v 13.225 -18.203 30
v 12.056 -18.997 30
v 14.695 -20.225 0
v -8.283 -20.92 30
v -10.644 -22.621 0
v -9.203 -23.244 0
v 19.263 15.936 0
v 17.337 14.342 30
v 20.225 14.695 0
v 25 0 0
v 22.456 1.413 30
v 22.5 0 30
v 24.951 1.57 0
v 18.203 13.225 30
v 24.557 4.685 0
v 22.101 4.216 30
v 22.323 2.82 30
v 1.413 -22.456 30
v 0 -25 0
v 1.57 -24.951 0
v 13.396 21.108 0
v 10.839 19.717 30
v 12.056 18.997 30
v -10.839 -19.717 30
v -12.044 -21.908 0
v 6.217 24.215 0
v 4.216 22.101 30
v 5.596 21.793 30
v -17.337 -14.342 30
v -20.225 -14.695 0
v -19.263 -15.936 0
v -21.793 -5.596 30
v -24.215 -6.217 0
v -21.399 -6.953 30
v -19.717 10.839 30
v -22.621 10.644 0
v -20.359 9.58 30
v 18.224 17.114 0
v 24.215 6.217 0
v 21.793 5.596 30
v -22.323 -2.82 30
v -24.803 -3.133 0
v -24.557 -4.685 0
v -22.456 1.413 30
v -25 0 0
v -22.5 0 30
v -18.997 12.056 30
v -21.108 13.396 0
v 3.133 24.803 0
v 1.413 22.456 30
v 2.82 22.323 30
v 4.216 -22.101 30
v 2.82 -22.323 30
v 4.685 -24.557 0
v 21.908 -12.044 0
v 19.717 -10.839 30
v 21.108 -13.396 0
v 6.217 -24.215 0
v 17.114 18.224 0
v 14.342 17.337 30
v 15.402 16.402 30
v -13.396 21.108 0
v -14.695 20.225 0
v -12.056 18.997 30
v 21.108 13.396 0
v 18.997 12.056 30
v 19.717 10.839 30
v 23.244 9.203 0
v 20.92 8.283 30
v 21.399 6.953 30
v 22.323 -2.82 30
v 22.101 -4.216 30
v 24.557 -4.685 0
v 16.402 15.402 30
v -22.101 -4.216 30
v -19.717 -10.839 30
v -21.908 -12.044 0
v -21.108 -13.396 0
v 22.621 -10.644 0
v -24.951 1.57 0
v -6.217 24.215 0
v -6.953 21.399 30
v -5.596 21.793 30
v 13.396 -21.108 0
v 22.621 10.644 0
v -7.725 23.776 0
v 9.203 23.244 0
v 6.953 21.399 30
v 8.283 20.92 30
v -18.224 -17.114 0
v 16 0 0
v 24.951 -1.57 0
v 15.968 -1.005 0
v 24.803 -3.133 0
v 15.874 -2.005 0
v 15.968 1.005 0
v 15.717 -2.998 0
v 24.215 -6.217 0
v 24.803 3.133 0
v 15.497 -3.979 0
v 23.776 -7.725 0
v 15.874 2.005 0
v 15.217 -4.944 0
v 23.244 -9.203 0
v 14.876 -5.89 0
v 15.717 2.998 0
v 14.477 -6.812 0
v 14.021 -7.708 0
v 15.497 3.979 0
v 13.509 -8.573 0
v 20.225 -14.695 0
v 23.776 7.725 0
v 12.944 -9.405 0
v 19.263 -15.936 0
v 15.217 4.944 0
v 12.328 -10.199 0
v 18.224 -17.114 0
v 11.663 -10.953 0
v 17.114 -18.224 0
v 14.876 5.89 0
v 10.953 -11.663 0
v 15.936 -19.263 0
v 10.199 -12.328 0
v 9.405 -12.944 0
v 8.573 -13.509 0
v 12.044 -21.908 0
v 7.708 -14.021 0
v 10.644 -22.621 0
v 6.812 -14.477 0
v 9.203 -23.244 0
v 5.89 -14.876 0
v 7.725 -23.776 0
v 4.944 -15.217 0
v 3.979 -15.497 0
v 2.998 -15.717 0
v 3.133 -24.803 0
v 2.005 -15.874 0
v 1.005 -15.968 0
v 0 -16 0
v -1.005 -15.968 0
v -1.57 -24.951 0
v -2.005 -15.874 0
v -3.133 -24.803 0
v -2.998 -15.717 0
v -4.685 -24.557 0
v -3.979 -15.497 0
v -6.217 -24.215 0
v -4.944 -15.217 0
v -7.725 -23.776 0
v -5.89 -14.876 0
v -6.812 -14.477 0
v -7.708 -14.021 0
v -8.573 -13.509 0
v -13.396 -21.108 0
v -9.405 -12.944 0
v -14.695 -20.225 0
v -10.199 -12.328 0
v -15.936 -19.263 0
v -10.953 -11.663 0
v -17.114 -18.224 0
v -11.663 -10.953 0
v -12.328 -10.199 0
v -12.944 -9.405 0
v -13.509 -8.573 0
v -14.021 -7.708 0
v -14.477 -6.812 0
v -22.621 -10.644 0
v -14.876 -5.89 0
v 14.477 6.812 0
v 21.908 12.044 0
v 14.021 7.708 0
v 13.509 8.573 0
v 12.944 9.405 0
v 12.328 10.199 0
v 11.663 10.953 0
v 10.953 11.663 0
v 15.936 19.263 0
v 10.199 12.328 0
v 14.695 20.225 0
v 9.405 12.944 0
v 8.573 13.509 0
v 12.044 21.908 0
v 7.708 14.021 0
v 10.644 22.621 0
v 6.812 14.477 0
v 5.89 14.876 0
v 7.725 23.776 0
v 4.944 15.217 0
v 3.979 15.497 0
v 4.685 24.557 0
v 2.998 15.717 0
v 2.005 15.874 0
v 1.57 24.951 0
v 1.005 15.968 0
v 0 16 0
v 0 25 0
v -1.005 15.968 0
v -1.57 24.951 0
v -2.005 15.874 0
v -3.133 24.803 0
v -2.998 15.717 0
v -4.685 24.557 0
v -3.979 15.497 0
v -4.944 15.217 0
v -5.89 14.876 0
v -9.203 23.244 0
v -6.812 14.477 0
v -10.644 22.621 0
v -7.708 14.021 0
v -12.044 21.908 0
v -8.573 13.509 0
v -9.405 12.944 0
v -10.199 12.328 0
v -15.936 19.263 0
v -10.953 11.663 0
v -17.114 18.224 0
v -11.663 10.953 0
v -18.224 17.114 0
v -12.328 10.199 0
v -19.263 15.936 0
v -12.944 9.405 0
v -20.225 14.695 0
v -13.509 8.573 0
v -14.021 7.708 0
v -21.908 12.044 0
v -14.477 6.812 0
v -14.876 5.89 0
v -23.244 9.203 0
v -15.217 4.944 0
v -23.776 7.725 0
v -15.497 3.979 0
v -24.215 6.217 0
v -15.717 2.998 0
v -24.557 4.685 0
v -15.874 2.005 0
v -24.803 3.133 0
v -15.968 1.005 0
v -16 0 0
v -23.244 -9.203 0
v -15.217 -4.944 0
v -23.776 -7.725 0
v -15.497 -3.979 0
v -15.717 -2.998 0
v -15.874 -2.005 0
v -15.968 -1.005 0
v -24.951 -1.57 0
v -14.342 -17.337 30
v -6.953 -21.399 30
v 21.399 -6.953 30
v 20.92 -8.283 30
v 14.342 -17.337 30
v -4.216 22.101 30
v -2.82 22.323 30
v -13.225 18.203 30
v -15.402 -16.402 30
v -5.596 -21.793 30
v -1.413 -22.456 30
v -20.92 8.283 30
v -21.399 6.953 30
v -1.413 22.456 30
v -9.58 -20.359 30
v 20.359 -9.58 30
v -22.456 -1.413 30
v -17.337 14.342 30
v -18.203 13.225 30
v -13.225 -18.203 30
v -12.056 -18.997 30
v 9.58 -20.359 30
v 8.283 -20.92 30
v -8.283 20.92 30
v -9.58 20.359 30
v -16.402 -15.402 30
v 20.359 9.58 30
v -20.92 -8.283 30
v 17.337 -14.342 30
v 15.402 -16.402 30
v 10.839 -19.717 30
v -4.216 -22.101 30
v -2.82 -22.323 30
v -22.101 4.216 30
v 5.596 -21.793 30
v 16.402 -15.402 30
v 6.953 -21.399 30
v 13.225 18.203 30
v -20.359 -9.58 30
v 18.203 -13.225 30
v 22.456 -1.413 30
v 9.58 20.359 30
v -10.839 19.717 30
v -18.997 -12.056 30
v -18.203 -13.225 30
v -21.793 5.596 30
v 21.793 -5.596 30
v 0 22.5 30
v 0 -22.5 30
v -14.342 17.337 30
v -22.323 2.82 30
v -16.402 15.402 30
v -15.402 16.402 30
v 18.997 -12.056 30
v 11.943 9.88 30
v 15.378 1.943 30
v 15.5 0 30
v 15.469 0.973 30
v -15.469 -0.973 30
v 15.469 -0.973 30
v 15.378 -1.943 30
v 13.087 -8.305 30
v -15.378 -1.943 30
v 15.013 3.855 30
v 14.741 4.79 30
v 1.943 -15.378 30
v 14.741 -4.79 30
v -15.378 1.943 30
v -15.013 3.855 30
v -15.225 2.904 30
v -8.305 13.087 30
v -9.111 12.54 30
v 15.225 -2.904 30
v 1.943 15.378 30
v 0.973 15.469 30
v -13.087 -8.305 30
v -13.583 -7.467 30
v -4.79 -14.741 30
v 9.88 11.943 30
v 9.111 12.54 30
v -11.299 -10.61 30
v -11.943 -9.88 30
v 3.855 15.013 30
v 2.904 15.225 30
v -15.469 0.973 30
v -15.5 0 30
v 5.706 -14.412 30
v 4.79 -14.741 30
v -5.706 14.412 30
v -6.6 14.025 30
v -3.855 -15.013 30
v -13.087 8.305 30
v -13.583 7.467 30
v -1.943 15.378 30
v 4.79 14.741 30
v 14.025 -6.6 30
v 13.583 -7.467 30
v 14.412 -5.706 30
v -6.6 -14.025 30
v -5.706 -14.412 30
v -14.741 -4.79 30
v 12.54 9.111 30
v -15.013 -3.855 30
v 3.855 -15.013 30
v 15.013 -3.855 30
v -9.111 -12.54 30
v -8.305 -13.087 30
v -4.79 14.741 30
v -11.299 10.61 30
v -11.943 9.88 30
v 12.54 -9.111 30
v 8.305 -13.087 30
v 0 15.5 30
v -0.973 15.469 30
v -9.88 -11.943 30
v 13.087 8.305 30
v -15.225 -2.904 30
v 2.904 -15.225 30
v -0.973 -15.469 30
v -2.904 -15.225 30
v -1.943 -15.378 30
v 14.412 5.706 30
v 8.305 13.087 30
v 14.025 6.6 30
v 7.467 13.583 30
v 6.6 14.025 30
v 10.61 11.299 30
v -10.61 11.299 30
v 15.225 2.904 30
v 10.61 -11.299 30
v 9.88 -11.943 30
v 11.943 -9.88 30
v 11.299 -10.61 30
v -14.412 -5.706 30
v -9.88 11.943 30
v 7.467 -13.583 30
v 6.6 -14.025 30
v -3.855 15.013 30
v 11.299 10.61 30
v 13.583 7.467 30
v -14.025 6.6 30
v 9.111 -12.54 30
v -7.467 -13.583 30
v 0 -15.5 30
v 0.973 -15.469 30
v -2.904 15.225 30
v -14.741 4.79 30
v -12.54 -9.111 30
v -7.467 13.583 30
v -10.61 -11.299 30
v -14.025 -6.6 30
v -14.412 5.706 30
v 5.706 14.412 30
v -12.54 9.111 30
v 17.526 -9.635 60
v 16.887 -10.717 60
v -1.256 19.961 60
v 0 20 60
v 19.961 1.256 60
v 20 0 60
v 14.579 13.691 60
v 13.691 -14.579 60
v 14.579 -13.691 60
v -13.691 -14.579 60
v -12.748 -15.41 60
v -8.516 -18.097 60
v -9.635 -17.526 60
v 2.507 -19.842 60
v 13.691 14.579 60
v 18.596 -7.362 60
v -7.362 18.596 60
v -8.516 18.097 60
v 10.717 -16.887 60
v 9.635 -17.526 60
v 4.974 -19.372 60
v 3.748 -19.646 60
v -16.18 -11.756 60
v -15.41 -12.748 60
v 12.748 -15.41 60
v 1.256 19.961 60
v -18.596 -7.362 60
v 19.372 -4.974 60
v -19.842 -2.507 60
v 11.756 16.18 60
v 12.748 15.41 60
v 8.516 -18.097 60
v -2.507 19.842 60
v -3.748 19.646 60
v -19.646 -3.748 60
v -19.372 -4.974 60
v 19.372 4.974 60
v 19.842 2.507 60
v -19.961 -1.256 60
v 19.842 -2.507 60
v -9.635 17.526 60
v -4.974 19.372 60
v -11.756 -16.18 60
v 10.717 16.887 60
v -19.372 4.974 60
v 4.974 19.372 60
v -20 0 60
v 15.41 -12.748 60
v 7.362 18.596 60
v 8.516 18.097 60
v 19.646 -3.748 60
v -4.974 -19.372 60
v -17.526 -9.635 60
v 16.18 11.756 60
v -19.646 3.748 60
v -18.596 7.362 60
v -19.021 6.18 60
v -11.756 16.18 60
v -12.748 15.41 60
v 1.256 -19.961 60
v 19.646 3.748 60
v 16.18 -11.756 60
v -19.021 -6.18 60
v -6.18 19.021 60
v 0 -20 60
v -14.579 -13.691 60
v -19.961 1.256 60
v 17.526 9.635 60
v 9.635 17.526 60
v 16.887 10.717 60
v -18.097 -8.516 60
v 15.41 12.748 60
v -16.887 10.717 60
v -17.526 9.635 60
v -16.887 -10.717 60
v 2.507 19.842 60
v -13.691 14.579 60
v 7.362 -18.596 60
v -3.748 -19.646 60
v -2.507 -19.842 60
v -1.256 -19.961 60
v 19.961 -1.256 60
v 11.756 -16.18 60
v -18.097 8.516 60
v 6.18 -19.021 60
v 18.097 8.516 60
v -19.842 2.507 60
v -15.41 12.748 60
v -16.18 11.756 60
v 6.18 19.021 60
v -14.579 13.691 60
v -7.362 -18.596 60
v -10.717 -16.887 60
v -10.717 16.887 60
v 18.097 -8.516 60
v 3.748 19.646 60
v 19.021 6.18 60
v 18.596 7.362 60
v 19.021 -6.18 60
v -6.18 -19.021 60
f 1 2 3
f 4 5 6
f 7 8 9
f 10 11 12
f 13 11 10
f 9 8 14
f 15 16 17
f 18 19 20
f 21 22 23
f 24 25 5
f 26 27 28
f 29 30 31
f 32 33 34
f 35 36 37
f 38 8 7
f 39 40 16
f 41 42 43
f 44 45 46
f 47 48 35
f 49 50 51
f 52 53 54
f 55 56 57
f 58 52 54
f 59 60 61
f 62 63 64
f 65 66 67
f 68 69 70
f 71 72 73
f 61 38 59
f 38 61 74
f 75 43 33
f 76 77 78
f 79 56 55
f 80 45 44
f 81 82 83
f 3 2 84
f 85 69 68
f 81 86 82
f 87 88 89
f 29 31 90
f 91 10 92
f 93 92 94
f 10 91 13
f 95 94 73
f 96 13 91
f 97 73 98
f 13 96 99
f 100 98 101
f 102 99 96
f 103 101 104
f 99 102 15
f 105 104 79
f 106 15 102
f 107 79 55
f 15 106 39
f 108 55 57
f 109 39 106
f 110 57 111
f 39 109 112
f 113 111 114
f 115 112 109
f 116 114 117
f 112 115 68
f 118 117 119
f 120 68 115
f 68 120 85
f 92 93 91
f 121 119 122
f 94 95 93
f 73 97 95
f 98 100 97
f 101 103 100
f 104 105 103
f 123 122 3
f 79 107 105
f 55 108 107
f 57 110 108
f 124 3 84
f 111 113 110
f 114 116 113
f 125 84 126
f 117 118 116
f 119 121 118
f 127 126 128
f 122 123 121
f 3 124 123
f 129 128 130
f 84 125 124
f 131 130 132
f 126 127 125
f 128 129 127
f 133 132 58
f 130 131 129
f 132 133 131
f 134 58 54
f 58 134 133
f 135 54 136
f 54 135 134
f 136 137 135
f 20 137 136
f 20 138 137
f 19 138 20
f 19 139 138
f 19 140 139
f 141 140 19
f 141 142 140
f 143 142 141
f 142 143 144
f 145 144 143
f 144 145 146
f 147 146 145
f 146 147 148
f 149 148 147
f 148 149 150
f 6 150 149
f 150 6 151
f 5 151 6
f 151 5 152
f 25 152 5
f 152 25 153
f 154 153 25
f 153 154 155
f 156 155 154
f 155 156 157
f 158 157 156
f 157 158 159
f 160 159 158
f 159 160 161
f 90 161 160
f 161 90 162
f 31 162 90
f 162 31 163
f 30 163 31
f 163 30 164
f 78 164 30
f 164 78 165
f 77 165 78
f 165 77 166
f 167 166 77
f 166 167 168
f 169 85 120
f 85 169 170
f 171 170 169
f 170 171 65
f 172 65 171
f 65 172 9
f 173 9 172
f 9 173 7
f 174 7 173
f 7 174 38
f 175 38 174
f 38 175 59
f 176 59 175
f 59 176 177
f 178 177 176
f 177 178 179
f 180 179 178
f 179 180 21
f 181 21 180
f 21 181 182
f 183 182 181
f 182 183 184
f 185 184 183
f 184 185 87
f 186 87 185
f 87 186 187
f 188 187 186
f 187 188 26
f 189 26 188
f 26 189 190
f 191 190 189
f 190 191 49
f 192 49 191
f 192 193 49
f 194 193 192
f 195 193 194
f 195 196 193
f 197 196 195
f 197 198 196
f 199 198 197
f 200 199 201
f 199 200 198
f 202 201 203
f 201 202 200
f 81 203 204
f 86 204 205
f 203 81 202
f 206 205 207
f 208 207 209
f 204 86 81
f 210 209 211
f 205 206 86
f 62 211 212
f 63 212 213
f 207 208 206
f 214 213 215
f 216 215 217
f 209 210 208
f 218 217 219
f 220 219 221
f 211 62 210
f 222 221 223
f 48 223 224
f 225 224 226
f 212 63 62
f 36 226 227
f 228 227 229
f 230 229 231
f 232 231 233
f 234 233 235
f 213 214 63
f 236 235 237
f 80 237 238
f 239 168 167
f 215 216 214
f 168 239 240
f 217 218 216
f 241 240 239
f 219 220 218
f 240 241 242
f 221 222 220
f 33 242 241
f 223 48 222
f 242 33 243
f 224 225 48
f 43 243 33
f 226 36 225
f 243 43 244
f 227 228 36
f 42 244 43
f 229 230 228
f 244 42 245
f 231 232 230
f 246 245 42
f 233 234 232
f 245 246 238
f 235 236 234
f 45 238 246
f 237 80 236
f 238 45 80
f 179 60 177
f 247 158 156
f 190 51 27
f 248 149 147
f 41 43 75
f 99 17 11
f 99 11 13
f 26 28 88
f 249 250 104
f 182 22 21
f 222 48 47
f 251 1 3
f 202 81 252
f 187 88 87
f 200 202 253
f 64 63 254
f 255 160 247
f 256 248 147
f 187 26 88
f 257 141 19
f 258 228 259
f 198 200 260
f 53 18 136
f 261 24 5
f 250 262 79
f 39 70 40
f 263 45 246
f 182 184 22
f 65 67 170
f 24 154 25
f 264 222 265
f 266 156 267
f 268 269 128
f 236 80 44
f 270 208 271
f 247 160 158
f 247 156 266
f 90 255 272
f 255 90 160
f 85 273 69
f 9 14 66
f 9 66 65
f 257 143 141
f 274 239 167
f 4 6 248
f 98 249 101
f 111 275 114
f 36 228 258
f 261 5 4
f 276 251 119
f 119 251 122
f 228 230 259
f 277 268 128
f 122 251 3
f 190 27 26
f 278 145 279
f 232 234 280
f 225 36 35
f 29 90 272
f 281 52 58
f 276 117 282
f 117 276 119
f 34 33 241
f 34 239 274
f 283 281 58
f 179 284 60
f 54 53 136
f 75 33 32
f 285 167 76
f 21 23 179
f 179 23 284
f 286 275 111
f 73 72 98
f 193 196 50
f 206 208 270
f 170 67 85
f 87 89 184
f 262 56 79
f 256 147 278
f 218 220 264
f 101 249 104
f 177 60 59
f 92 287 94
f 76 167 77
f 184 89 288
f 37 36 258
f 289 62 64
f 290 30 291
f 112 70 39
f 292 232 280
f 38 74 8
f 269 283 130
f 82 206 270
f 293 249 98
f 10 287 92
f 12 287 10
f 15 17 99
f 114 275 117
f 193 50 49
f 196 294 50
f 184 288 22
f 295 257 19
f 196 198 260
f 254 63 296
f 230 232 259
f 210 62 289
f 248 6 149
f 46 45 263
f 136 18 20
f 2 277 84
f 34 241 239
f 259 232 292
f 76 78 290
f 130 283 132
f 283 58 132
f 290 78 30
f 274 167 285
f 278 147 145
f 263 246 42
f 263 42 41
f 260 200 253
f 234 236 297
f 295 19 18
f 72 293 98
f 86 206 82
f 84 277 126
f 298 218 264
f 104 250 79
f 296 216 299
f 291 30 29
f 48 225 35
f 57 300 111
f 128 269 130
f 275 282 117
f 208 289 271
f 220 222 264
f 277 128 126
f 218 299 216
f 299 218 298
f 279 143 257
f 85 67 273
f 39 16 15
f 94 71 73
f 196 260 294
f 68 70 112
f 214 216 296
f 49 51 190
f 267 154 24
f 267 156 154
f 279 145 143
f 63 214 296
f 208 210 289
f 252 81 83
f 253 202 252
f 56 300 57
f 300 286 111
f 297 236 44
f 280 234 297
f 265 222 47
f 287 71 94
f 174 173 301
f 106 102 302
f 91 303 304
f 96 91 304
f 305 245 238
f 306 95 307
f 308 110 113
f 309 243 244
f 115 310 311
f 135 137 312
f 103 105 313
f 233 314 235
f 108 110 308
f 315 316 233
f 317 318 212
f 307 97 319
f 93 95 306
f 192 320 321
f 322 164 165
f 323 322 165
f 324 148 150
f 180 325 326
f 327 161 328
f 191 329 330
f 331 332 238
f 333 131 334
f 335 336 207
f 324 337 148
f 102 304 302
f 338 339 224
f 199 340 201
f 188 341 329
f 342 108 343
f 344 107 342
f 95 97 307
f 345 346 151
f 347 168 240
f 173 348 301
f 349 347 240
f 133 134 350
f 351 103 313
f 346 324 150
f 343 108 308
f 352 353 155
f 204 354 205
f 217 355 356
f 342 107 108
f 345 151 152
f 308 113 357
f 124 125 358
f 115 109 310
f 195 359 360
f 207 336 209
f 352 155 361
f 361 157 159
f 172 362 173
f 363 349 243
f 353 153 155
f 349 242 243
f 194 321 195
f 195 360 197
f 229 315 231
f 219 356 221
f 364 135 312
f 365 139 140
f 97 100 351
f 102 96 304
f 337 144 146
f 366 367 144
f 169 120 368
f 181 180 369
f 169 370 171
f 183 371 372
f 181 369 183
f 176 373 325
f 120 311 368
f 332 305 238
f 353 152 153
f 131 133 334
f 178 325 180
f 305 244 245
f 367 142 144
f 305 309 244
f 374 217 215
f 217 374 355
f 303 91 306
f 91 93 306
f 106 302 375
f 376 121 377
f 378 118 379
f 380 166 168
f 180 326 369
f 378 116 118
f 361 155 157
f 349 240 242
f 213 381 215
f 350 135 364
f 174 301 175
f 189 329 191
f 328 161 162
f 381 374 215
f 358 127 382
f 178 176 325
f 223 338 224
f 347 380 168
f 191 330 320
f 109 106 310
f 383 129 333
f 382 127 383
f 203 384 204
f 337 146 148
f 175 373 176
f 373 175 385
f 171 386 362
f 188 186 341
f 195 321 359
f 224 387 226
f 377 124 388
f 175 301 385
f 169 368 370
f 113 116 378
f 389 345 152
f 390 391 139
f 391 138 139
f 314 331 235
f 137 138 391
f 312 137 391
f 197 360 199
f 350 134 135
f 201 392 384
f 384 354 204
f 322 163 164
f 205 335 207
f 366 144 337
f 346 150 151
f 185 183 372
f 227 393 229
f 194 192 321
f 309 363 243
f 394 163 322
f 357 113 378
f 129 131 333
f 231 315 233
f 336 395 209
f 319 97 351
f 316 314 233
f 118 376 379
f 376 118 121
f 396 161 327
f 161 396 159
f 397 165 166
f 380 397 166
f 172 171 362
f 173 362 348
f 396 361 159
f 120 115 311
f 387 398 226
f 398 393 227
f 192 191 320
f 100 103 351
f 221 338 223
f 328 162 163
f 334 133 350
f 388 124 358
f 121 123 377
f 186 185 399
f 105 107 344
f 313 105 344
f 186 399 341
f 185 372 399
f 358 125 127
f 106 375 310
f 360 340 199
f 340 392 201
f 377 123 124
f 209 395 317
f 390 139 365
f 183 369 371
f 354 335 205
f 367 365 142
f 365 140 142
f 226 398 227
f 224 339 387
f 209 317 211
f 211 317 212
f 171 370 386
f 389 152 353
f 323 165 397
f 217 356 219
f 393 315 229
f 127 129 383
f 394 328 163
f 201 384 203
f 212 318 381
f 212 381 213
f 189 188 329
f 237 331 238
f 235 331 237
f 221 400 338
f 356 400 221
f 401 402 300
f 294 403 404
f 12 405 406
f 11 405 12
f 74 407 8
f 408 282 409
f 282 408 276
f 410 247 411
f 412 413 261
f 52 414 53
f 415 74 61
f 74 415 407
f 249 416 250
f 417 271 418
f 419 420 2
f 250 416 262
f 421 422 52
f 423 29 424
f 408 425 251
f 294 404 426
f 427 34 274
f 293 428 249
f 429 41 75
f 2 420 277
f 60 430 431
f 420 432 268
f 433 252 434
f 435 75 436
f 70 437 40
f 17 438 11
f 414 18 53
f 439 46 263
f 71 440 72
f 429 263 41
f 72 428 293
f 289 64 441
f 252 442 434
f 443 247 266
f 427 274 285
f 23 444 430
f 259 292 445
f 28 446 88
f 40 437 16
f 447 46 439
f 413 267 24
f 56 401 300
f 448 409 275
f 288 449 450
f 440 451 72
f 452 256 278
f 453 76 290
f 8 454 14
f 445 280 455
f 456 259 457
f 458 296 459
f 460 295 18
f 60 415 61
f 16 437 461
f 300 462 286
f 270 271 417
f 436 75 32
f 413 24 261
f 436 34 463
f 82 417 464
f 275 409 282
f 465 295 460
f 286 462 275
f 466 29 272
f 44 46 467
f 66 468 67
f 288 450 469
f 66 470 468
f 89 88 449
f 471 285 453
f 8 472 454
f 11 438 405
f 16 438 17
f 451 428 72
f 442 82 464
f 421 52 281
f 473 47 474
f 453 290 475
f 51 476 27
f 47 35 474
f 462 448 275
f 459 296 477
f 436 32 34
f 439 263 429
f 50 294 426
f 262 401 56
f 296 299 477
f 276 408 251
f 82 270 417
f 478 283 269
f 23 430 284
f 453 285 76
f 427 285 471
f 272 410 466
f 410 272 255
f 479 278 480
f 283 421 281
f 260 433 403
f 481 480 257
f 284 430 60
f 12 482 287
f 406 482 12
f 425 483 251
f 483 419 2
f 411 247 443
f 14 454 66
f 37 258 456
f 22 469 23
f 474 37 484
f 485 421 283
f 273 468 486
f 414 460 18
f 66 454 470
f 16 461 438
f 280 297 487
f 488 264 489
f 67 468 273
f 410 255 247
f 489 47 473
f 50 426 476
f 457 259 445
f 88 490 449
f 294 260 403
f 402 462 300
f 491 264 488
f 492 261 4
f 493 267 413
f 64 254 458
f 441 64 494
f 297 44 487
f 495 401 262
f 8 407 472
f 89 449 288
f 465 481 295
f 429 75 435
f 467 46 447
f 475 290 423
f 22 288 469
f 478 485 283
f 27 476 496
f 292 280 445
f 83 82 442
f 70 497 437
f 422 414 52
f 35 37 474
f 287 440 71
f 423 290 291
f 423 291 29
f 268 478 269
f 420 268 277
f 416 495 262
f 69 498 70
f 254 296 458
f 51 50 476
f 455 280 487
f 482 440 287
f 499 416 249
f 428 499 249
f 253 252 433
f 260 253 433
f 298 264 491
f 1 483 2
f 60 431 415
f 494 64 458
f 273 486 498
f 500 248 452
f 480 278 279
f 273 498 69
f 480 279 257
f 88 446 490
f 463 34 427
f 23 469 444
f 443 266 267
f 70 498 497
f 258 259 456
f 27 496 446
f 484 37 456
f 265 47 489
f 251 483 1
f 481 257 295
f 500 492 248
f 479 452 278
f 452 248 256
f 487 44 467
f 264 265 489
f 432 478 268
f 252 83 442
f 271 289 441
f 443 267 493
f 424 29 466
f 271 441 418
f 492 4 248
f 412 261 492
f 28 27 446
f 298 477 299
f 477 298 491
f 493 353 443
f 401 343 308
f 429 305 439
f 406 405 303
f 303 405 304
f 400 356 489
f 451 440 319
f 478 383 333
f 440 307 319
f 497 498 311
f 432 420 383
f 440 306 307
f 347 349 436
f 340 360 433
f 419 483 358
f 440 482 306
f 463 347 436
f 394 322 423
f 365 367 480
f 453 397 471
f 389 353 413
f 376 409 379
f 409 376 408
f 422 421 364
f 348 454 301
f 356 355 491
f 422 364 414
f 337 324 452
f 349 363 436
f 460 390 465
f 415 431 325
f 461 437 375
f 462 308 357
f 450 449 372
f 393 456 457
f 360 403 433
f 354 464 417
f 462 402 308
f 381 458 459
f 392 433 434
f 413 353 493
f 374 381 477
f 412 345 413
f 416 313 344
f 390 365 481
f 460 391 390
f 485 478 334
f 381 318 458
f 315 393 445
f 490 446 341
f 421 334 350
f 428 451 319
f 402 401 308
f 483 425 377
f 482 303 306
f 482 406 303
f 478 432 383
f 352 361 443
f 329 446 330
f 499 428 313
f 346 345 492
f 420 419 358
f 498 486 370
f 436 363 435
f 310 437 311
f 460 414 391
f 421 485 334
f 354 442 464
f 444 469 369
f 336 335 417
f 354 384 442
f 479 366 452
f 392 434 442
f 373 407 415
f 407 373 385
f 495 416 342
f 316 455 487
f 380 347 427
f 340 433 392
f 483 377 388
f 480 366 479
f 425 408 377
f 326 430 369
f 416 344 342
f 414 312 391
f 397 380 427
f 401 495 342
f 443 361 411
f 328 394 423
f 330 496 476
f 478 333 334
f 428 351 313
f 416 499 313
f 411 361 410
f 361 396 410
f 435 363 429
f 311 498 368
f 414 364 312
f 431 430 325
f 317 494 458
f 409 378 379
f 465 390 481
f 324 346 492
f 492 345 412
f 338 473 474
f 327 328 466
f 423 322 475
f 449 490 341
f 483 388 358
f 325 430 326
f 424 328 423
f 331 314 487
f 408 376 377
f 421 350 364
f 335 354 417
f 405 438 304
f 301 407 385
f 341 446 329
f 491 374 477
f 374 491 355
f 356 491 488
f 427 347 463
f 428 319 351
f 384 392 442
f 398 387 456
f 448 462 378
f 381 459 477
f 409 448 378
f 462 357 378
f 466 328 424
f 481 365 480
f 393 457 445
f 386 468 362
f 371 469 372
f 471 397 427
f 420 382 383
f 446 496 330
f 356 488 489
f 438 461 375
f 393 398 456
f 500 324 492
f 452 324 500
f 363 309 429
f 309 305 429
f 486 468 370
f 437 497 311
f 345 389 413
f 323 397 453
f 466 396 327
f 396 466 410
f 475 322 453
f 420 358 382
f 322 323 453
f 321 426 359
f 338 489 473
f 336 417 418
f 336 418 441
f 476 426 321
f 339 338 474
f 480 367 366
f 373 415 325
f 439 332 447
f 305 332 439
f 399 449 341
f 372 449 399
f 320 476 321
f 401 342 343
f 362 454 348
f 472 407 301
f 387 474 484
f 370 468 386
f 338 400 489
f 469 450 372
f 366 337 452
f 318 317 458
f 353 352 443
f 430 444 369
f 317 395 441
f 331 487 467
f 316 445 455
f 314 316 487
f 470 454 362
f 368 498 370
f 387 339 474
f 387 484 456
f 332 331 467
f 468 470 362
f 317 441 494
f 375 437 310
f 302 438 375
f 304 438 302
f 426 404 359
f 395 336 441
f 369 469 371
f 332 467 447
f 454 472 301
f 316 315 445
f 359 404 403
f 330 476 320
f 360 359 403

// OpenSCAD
/*
Version=3.0
*/
outerDiameter1 = 45;
outerDiameter2 = 50.0;

innerDiameter1 = 31.0;
innerDiameter2 = 32.0;

outerDiameter3 = outerDiameter1;
outerDiameter4 = 40;

innerDiameter3 = 31.0;
innerDiameter4 = outerDiameter4;

height = 30;

module tube(h, od1, od2, id1, id2)
{
    difference()
    {
        cylinder(h=h, d1=od1, d2=od2, center=false, $fn=100);
        cylinder(h=h, d1=id1, d2=id2, center=false, $fn=100);
    }
}

union()
{
    tube(height, outerDiameter2, outerDiameter1, innerDiameter2,innerDiameter1);
    translate([0,0,height])tube(height, outerDiameter3, outerDiameter4, innerDiameter3,innerDiameter4);
}
